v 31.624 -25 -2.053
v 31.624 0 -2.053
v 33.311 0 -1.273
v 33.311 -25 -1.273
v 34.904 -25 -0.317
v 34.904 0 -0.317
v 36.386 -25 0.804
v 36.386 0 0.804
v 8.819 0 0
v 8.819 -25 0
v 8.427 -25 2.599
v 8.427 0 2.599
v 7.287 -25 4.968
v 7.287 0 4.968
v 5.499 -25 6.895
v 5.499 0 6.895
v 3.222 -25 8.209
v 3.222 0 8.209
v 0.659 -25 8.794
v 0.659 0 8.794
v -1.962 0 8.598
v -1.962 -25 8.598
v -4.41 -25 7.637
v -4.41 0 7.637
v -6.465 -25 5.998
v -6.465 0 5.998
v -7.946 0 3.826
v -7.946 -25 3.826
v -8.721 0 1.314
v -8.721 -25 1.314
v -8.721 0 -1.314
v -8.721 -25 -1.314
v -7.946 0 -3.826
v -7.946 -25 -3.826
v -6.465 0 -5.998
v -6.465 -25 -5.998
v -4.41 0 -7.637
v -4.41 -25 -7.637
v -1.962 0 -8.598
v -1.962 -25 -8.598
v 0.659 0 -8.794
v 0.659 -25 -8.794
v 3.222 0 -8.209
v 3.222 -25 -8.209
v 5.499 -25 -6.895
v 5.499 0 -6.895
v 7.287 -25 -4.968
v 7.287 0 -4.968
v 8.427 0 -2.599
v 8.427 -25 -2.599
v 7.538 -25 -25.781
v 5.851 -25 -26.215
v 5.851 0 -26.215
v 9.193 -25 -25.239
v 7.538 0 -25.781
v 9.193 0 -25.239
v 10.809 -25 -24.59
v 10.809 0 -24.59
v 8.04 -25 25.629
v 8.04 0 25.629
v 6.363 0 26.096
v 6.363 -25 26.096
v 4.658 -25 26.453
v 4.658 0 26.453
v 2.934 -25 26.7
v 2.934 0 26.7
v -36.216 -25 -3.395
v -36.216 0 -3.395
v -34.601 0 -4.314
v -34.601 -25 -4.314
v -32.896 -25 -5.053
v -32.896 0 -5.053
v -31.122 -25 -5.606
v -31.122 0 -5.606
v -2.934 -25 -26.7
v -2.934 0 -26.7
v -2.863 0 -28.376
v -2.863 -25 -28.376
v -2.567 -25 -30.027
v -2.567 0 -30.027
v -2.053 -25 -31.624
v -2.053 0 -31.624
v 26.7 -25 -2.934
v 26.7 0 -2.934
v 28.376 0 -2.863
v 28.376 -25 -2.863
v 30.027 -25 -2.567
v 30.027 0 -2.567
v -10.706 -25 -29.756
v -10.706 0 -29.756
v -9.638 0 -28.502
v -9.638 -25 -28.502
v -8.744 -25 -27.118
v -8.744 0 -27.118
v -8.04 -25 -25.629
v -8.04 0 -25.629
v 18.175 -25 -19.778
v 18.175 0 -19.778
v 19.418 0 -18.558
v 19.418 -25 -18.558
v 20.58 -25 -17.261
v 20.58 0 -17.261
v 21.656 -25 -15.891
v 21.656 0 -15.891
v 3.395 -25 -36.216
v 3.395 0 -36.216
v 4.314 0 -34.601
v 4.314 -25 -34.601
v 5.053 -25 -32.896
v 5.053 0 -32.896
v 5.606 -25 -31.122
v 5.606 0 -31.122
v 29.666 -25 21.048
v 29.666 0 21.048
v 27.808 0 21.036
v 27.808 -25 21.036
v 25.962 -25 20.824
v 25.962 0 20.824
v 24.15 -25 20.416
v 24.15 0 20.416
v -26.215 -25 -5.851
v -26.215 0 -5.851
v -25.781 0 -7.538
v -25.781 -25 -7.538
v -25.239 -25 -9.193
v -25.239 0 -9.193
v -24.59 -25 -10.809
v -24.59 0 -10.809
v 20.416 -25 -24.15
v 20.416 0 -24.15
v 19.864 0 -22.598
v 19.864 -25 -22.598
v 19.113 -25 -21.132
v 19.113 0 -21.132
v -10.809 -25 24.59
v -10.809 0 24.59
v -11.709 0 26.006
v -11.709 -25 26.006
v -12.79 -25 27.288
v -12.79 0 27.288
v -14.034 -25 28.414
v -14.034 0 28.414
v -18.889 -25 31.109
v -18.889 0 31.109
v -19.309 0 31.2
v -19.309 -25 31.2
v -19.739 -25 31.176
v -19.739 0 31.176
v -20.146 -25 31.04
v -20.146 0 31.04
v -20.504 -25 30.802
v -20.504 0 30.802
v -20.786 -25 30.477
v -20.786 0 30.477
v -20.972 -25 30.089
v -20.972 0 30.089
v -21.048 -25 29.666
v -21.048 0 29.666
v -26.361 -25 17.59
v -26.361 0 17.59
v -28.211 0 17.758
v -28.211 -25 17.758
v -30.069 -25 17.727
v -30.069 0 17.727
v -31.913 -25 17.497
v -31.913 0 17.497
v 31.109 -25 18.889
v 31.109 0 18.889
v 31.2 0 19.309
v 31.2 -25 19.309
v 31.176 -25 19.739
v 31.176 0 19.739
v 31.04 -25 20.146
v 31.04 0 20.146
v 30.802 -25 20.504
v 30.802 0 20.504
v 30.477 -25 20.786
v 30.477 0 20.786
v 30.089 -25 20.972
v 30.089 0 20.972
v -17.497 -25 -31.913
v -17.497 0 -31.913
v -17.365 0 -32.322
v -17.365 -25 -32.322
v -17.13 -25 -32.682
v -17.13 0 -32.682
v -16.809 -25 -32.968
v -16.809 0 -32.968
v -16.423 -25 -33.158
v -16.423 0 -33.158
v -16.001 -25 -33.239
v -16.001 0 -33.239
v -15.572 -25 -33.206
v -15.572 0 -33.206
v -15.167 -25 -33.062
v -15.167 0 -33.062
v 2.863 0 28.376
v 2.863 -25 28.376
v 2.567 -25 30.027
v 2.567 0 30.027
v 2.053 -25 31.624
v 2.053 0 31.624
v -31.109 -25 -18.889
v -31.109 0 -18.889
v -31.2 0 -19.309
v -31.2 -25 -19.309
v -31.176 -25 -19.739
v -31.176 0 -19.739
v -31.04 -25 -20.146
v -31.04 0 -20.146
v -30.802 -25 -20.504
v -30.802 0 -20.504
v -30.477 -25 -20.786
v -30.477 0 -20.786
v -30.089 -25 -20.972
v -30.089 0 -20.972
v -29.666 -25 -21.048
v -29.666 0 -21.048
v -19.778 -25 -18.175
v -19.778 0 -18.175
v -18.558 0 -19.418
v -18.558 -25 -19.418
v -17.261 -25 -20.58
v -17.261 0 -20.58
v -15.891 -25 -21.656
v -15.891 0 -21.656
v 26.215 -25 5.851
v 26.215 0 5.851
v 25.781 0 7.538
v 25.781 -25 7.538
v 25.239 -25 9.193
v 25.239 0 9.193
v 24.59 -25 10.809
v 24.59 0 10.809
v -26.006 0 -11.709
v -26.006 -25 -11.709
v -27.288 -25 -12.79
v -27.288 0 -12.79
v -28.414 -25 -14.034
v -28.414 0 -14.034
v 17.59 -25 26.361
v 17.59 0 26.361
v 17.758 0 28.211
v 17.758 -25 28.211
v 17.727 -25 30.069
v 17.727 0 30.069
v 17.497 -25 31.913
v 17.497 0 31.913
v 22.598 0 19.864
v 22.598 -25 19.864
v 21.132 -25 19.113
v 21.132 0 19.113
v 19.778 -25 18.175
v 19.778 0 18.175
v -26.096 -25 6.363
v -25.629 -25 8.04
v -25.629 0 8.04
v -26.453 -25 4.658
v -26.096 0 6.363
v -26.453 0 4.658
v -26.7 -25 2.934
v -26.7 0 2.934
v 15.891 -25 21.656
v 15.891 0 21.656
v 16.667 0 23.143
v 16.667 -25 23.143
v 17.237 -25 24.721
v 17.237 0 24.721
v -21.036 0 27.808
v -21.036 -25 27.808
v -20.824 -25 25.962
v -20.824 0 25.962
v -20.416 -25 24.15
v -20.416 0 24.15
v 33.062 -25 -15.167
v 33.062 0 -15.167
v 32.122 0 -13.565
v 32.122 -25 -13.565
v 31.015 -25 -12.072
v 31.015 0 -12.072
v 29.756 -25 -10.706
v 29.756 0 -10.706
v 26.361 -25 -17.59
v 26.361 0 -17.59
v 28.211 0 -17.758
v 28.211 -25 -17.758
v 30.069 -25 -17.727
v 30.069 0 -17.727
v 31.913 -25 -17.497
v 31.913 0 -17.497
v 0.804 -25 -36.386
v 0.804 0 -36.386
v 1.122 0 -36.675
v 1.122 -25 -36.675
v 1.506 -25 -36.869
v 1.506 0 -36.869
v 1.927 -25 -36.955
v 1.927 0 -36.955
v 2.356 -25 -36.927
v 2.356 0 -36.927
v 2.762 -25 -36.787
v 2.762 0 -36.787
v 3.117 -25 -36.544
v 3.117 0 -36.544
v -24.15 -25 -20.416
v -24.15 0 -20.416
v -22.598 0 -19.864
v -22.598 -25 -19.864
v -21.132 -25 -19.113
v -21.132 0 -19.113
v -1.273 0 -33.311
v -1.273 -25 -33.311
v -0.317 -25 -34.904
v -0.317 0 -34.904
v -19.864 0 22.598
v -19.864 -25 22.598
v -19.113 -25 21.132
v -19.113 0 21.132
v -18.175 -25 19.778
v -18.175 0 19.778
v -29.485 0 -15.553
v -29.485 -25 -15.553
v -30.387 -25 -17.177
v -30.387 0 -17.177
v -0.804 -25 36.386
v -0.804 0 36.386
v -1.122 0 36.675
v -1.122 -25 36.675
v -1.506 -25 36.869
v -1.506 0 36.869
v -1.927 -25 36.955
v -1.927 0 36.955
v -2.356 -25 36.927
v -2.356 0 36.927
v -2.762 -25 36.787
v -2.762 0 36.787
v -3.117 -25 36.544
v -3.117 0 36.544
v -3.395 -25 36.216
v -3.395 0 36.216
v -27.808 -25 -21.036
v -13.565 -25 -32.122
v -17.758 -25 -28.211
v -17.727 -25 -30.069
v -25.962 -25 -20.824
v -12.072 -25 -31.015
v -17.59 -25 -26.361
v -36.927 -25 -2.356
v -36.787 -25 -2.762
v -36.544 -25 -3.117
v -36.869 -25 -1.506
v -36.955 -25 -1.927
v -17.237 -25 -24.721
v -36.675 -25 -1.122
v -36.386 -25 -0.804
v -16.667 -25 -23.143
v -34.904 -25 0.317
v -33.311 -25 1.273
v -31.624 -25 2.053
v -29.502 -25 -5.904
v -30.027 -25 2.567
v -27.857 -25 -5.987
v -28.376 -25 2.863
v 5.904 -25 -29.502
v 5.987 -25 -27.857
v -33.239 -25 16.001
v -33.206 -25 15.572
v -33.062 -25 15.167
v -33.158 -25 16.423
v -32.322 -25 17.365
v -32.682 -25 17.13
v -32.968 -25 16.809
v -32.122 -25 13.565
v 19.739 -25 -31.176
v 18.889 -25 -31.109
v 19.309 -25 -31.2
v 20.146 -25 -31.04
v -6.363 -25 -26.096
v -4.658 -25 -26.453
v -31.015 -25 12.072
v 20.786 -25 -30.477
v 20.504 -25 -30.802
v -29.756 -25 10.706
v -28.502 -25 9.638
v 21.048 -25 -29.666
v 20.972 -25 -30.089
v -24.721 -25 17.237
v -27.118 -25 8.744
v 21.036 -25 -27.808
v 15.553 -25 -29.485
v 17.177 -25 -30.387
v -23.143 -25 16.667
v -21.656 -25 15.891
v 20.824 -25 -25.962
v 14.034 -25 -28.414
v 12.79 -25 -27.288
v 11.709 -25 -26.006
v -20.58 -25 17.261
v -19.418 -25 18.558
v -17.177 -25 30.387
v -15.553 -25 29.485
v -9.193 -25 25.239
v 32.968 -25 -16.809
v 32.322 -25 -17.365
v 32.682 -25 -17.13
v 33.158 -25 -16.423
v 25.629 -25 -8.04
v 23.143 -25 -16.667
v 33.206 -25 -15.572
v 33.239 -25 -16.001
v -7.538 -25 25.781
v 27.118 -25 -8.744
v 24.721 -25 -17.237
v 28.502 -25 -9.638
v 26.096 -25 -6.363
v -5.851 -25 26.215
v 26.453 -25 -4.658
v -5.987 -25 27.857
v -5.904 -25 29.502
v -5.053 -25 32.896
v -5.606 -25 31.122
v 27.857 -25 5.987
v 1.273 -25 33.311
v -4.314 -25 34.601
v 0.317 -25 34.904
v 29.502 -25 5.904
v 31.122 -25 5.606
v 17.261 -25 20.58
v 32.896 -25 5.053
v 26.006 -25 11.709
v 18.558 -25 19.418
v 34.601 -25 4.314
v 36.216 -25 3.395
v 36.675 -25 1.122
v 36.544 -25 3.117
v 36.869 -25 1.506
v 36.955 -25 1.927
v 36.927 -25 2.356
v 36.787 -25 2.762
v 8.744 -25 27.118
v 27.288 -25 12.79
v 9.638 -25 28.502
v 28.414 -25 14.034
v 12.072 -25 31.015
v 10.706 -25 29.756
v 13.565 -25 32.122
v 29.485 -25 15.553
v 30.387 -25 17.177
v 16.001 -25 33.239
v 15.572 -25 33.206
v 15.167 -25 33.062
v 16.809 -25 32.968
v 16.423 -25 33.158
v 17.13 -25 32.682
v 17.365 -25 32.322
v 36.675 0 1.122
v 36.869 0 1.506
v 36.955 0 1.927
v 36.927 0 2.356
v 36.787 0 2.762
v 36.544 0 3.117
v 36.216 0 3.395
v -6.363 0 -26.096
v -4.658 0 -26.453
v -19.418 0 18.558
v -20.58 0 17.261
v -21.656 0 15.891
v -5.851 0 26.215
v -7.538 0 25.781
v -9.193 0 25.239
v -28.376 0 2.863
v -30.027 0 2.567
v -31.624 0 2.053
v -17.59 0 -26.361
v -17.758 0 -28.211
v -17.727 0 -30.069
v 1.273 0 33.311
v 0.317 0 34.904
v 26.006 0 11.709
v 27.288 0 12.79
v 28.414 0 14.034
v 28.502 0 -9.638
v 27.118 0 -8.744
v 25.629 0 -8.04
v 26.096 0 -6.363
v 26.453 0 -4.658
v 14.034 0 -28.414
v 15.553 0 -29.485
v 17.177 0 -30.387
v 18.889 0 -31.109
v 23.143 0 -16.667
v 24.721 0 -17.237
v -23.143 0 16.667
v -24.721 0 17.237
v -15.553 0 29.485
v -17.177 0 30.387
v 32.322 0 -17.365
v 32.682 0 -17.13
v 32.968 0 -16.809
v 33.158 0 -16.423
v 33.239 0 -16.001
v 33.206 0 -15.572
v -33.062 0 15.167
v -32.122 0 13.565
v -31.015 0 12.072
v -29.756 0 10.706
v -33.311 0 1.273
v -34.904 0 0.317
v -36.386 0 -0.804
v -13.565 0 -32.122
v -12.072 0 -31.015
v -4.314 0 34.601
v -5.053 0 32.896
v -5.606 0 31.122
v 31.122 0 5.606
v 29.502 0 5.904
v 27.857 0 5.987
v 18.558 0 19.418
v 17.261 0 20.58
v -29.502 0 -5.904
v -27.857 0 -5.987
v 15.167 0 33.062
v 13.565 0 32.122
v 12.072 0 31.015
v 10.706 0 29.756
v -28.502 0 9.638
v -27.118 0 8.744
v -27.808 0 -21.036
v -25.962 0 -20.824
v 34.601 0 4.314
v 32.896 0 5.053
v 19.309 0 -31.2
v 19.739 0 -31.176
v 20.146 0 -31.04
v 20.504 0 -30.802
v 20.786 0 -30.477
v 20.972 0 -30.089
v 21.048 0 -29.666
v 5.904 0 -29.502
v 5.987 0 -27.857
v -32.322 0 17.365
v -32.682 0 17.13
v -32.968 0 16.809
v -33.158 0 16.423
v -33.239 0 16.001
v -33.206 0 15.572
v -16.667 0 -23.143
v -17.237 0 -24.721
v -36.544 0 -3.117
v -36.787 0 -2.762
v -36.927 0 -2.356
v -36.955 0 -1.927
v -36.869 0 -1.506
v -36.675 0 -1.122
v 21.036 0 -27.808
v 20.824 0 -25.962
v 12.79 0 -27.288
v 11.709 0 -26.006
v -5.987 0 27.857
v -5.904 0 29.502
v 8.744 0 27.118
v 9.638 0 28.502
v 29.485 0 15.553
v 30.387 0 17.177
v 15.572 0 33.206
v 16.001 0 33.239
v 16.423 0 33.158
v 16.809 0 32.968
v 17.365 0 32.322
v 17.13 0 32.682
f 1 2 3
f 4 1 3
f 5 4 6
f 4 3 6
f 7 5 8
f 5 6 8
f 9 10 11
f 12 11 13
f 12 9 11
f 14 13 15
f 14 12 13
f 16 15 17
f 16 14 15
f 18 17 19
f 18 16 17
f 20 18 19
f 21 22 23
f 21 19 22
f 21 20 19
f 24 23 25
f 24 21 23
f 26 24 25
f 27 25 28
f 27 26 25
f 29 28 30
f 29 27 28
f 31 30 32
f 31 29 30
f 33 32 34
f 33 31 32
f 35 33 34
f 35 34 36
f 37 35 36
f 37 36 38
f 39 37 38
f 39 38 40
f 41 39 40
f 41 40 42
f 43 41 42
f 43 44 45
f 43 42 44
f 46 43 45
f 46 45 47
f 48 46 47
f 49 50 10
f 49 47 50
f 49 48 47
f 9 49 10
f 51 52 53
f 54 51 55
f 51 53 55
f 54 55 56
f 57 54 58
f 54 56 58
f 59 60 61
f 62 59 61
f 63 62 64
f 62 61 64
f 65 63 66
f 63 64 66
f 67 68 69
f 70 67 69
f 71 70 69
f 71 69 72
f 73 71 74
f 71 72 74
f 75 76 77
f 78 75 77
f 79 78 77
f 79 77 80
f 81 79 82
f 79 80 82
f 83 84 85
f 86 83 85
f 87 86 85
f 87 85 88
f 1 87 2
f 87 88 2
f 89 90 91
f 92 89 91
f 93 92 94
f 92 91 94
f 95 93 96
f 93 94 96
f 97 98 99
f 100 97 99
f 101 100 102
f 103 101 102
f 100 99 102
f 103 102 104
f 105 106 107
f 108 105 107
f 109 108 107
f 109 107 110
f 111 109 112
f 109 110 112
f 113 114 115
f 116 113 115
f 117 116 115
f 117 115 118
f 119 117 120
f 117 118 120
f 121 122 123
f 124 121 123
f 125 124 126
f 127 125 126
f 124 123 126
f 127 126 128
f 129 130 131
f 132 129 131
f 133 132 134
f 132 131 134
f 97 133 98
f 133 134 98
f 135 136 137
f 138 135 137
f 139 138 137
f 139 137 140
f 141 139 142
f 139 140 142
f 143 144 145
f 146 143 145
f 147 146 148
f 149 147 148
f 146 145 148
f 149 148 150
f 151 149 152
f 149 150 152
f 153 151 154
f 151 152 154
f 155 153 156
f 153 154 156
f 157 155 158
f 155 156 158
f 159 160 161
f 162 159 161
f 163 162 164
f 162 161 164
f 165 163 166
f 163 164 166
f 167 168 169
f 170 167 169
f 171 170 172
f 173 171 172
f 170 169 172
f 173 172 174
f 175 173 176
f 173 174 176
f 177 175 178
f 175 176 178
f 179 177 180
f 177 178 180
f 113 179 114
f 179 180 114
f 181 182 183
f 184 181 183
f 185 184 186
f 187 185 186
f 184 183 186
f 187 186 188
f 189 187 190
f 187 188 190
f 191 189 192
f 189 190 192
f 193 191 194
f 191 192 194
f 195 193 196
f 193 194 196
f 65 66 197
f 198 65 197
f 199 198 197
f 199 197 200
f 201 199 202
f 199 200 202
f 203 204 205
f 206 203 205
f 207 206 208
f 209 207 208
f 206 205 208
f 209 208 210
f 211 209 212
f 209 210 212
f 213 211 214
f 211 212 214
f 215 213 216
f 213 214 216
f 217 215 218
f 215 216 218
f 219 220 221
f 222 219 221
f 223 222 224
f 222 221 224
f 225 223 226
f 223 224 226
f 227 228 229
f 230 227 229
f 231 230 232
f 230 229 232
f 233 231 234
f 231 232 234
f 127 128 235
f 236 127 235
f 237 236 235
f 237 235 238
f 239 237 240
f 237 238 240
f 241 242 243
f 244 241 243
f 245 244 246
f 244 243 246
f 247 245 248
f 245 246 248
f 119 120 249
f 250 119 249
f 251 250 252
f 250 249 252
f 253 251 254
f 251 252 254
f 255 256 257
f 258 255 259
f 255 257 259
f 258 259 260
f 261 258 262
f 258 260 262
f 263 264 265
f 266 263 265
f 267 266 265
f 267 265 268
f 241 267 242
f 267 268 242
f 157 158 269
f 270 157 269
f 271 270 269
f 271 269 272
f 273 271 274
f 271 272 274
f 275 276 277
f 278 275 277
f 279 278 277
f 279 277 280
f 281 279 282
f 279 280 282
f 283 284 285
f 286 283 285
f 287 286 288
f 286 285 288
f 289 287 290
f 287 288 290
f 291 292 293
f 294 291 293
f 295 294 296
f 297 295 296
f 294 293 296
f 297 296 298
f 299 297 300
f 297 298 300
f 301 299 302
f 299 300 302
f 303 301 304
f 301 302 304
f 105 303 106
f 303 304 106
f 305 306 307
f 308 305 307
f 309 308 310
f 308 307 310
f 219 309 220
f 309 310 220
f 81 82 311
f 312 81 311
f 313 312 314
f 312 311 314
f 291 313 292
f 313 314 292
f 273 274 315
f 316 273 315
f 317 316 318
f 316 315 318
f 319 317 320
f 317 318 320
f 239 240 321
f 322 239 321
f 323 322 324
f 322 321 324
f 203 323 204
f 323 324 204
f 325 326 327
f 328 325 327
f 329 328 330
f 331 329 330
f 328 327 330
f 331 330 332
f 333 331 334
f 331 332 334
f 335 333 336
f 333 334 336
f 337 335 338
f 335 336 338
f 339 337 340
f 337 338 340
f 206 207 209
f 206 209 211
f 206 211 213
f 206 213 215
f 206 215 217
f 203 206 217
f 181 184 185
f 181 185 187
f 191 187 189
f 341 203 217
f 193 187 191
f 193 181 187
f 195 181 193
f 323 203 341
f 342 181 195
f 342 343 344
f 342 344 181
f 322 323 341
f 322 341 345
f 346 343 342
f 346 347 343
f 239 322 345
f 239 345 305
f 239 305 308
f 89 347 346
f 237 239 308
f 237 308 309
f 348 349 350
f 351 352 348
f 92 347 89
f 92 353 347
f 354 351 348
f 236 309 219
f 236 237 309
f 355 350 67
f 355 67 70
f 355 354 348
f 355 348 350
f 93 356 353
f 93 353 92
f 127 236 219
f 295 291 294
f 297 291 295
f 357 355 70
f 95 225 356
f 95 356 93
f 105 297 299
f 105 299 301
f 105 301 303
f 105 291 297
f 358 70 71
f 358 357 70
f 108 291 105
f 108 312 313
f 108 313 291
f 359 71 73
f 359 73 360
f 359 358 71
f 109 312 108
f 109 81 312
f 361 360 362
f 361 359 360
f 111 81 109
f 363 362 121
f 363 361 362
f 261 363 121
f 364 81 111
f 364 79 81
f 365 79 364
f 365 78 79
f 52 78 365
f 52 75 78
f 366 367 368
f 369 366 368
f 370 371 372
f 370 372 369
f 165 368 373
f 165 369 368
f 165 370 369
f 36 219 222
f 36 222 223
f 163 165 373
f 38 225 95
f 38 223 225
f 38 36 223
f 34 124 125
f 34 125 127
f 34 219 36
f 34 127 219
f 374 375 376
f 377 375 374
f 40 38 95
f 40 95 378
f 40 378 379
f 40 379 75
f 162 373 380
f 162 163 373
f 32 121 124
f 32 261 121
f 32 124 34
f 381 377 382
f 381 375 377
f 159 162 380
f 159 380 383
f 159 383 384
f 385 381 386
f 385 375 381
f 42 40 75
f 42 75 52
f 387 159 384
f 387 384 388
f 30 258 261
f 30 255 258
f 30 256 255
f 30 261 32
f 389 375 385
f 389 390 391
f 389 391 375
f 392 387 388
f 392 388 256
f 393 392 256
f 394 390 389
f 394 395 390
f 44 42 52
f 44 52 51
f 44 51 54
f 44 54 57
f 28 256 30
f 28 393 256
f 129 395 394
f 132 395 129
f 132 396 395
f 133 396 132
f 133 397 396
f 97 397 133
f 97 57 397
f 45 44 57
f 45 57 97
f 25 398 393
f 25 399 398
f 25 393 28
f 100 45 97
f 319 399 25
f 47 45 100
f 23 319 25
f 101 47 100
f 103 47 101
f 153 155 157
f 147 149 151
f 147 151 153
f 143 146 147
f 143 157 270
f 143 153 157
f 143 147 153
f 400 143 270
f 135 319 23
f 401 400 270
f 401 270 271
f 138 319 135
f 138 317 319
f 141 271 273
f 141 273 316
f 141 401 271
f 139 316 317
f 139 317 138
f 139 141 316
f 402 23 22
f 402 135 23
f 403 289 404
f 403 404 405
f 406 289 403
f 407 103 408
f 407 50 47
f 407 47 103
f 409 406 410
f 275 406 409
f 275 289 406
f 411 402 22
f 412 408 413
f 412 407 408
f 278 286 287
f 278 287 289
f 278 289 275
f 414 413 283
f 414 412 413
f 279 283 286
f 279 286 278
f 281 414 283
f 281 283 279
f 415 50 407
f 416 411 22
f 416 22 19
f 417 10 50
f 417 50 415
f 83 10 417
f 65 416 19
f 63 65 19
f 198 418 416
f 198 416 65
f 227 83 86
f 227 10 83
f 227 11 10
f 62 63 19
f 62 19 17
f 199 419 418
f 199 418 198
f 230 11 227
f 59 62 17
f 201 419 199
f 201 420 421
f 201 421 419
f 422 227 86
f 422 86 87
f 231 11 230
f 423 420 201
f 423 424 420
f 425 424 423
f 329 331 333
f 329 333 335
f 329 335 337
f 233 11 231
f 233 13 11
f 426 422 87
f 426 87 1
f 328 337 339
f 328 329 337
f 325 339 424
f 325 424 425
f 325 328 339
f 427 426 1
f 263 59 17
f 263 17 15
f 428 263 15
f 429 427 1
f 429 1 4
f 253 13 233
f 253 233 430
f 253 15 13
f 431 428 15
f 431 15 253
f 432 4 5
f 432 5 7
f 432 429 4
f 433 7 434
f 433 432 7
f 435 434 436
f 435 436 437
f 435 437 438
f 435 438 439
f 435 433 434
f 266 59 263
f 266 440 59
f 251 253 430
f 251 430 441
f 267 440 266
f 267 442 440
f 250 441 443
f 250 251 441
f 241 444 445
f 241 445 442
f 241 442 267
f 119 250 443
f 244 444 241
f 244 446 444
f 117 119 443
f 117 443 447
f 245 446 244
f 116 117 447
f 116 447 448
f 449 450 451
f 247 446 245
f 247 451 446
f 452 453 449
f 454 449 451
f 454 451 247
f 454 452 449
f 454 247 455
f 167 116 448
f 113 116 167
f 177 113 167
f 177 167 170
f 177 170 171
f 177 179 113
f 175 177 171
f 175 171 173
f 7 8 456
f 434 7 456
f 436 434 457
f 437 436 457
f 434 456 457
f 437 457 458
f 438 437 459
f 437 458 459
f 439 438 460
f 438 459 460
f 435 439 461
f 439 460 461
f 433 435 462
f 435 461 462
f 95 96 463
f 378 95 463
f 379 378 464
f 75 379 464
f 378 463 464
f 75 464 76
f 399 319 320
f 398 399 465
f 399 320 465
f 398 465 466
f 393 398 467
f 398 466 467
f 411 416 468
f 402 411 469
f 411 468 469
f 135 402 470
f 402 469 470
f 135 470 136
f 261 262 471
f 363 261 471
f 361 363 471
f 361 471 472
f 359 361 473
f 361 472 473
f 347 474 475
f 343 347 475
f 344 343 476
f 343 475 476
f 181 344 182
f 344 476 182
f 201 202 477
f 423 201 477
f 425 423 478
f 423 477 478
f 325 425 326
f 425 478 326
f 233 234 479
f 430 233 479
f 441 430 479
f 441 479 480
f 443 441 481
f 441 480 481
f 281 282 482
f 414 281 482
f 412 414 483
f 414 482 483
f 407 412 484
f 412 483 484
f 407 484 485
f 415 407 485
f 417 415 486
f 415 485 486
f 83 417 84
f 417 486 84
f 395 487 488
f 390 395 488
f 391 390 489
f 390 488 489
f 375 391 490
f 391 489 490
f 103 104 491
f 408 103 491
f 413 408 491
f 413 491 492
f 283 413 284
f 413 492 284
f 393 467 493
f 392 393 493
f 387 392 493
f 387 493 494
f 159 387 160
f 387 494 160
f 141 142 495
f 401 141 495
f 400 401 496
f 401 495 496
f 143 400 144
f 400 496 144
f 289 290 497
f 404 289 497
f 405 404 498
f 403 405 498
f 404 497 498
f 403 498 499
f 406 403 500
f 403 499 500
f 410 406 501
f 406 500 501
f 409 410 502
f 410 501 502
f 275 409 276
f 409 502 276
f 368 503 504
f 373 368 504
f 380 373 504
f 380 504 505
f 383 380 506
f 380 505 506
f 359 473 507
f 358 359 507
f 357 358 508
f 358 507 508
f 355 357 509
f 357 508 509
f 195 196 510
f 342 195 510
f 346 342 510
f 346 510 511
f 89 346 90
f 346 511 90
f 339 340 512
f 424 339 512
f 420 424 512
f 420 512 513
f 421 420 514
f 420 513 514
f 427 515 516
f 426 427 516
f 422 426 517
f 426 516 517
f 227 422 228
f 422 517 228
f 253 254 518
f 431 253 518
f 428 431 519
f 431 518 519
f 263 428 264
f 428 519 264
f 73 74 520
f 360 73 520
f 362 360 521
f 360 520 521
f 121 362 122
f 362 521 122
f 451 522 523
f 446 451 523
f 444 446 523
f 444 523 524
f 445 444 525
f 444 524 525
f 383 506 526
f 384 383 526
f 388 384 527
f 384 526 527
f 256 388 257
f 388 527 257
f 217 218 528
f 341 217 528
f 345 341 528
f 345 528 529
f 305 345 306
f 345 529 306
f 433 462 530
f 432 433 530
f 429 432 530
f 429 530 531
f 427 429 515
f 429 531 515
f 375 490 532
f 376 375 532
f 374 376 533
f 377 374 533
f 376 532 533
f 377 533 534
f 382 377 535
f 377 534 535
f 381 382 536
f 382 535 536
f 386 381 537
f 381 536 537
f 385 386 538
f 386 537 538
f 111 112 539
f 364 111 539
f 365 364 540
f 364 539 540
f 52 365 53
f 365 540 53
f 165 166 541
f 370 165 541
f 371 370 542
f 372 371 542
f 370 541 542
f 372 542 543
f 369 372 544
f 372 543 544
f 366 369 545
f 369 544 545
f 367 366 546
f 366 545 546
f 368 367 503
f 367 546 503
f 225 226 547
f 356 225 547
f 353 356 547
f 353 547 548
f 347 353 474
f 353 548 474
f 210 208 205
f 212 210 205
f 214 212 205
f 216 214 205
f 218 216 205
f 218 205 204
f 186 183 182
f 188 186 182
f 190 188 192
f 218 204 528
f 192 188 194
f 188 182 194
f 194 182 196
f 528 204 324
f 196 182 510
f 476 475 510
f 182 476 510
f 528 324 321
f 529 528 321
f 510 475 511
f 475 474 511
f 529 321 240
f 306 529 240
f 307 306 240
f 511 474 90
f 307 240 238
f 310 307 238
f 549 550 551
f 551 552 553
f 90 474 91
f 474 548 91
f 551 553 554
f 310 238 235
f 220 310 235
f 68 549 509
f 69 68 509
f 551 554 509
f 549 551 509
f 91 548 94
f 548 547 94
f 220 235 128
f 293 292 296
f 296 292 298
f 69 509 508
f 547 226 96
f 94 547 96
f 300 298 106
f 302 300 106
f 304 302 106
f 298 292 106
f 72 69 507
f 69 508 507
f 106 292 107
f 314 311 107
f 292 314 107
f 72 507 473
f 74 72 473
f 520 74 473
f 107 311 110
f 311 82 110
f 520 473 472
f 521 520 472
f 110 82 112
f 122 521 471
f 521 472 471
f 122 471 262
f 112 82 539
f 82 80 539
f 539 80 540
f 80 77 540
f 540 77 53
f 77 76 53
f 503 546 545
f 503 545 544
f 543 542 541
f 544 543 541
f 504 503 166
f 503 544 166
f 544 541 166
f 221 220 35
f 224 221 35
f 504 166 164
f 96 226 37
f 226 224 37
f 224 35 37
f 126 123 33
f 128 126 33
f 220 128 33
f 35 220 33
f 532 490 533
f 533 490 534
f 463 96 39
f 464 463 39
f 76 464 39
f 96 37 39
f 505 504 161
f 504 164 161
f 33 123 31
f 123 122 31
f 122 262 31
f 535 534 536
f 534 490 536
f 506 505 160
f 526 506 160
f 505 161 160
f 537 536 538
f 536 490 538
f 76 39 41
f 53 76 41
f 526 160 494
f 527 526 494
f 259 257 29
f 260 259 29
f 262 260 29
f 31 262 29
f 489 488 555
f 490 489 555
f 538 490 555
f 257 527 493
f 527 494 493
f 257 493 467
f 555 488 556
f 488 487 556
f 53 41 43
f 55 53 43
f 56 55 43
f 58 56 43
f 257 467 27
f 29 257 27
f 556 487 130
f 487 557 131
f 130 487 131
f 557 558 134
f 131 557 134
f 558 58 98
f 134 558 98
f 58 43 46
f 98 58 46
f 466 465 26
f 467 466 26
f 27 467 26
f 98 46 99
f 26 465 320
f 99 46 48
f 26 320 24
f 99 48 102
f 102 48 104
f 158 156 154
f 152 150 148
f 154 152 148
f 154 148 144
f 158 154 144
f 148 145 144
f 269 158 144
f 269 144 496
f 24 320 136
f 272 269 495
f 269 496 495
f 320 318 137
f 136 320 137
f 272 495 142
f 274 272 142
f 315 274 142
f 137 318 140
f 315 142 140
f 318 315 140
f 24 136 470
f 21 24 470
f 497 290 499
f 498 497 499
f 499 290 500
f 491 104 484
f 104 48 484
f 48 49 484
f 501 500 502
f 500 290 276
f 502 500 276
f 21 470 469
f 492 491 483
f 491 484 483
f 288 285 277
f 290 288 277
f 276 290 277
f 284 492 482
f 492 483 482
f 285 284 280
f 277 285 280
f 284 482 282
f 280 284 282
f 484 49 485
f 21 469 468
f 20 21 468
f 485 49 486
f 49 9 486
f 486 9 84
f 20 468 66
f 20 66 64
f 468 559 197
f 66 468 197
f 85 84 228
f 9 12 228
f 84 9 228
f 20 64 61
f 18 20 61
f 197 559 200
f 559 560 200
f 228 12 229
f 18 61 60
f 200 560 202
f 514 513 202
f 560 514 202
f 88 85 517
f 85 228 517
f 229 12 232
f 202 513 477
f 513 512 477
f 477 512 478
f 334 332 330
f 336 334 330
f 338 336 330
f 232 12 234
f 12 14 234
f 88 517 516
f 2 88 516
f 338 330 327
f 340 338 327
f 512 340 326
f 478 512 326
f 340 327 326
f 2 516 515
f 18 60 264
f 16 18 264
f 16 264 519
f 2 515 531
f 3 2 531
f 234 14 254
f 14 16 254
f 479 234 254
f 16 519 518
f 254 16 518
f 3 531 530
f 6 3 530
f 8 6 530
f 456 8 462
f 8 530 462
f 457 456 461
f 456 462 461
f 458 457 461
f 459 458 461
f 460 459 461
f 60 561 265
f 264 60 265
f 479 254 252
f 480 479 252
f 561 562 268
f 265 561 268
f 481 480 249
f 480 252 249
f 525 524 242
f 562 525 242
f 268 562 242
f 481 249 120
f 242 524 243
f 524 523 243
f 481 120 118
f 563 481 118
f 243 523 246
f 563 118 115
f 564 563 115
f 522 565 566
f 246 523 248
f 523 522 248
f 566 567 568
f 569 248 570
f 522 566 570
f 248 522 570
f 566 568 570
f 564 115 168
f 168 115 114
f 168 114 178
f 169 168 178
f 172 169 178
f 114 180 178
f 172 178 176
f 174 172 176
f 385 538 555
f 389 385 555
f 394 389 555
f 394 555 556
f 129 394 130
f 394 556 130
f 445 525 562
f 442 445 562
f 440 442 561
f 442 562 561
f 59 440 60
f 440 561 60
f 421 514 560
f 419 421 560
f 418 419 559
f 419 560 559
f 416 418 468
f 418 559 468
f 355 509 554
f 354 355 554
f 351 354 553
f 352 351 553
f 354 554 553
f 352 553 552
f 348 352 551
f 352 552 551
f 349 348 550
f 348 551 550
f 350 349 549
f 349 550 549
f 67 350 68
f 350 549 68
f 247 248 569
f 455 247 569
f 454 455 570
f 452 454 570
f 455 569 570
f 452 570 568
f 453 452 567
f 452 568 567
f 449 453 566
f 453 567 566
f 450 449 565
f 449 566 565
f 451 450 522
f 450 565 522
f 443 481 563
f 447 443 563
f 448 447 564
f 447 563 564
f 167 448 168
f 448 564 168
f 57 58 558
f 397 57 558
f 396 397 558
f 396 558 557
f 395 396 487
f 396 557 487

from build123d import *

# Parameters (mm, degrees)
F0_R     = 8.8190251349
F1_DEPTH = 25
F2_COUNT = 12


# Not quite as in the source:
# - a feature names something its author has since deleted; it is built from what else it names


with BuildPart() as f1:
    # F0 (on Front) → F1 (new body)
    with BuildSketch(Plane.XZ):
        with BuildLine():
            ThreePointArc((-5.8511671906, 26.2154592323), (-16.7976364993, -20.9601018196), (26.8605, 0))
            ThreePointArc((26.8605, 0), (20.0037882945, 17.9258169722), (2.9342950433, 26.6997448087))
            ThreePointArc((2.9342950433, 26.6997448087), (-1.4784007951, 26.8197835811), (-5.8511671906, 26.2154592323))
        make_face()
        Circle(F0_R, mode=Mode.SUBTRACT)
        with BuildLine():
            ThreePointArc((-5.8511671906, 26.2154592323), (-1.4784007951, 26.8197835811), (2.9342950433, 26.6997448087))
            ThreePointArc((2.9342950433, 26.6997448087), (2.7429832933, 29.2065995461), (2.0526051191, 31.6240980128))
            ThreePointArc((2.0526051191, 31.6240980128), (0.8166449435, 34.1202908544), (-0.8038354447, 36.3858193952))
            ThreePointArc((-0.8038354447, 36.3858193952), (-2.1425207788, 36.9553506751), (-3.3954147249, 36.215958315))
            ThreePointArc((-3.3954147249, 36.215958315), (-4.7063208649, 33.7582965503), (-5.6058886832, 31.122133809))
            ThreePointArc((-5.6058886832, 31.122133809), (-5.9726089783, 28.6809978257), (-5.8511671906, 26.2154592323))
        make_face()
    extrude(amount=F1_DEPTH)

    # F2: F1 ×12 about axis
    f2_axis = Axis((0, 0, 0), (0, 1, 0))


with BuildPart() as f1_1:
    add(f1.part)
    for i in range(1, F2_COUNT):
        add(f1.part.rotate(f2_axis, i * 360 / F2_COUNT))


solid = f1_1.part
